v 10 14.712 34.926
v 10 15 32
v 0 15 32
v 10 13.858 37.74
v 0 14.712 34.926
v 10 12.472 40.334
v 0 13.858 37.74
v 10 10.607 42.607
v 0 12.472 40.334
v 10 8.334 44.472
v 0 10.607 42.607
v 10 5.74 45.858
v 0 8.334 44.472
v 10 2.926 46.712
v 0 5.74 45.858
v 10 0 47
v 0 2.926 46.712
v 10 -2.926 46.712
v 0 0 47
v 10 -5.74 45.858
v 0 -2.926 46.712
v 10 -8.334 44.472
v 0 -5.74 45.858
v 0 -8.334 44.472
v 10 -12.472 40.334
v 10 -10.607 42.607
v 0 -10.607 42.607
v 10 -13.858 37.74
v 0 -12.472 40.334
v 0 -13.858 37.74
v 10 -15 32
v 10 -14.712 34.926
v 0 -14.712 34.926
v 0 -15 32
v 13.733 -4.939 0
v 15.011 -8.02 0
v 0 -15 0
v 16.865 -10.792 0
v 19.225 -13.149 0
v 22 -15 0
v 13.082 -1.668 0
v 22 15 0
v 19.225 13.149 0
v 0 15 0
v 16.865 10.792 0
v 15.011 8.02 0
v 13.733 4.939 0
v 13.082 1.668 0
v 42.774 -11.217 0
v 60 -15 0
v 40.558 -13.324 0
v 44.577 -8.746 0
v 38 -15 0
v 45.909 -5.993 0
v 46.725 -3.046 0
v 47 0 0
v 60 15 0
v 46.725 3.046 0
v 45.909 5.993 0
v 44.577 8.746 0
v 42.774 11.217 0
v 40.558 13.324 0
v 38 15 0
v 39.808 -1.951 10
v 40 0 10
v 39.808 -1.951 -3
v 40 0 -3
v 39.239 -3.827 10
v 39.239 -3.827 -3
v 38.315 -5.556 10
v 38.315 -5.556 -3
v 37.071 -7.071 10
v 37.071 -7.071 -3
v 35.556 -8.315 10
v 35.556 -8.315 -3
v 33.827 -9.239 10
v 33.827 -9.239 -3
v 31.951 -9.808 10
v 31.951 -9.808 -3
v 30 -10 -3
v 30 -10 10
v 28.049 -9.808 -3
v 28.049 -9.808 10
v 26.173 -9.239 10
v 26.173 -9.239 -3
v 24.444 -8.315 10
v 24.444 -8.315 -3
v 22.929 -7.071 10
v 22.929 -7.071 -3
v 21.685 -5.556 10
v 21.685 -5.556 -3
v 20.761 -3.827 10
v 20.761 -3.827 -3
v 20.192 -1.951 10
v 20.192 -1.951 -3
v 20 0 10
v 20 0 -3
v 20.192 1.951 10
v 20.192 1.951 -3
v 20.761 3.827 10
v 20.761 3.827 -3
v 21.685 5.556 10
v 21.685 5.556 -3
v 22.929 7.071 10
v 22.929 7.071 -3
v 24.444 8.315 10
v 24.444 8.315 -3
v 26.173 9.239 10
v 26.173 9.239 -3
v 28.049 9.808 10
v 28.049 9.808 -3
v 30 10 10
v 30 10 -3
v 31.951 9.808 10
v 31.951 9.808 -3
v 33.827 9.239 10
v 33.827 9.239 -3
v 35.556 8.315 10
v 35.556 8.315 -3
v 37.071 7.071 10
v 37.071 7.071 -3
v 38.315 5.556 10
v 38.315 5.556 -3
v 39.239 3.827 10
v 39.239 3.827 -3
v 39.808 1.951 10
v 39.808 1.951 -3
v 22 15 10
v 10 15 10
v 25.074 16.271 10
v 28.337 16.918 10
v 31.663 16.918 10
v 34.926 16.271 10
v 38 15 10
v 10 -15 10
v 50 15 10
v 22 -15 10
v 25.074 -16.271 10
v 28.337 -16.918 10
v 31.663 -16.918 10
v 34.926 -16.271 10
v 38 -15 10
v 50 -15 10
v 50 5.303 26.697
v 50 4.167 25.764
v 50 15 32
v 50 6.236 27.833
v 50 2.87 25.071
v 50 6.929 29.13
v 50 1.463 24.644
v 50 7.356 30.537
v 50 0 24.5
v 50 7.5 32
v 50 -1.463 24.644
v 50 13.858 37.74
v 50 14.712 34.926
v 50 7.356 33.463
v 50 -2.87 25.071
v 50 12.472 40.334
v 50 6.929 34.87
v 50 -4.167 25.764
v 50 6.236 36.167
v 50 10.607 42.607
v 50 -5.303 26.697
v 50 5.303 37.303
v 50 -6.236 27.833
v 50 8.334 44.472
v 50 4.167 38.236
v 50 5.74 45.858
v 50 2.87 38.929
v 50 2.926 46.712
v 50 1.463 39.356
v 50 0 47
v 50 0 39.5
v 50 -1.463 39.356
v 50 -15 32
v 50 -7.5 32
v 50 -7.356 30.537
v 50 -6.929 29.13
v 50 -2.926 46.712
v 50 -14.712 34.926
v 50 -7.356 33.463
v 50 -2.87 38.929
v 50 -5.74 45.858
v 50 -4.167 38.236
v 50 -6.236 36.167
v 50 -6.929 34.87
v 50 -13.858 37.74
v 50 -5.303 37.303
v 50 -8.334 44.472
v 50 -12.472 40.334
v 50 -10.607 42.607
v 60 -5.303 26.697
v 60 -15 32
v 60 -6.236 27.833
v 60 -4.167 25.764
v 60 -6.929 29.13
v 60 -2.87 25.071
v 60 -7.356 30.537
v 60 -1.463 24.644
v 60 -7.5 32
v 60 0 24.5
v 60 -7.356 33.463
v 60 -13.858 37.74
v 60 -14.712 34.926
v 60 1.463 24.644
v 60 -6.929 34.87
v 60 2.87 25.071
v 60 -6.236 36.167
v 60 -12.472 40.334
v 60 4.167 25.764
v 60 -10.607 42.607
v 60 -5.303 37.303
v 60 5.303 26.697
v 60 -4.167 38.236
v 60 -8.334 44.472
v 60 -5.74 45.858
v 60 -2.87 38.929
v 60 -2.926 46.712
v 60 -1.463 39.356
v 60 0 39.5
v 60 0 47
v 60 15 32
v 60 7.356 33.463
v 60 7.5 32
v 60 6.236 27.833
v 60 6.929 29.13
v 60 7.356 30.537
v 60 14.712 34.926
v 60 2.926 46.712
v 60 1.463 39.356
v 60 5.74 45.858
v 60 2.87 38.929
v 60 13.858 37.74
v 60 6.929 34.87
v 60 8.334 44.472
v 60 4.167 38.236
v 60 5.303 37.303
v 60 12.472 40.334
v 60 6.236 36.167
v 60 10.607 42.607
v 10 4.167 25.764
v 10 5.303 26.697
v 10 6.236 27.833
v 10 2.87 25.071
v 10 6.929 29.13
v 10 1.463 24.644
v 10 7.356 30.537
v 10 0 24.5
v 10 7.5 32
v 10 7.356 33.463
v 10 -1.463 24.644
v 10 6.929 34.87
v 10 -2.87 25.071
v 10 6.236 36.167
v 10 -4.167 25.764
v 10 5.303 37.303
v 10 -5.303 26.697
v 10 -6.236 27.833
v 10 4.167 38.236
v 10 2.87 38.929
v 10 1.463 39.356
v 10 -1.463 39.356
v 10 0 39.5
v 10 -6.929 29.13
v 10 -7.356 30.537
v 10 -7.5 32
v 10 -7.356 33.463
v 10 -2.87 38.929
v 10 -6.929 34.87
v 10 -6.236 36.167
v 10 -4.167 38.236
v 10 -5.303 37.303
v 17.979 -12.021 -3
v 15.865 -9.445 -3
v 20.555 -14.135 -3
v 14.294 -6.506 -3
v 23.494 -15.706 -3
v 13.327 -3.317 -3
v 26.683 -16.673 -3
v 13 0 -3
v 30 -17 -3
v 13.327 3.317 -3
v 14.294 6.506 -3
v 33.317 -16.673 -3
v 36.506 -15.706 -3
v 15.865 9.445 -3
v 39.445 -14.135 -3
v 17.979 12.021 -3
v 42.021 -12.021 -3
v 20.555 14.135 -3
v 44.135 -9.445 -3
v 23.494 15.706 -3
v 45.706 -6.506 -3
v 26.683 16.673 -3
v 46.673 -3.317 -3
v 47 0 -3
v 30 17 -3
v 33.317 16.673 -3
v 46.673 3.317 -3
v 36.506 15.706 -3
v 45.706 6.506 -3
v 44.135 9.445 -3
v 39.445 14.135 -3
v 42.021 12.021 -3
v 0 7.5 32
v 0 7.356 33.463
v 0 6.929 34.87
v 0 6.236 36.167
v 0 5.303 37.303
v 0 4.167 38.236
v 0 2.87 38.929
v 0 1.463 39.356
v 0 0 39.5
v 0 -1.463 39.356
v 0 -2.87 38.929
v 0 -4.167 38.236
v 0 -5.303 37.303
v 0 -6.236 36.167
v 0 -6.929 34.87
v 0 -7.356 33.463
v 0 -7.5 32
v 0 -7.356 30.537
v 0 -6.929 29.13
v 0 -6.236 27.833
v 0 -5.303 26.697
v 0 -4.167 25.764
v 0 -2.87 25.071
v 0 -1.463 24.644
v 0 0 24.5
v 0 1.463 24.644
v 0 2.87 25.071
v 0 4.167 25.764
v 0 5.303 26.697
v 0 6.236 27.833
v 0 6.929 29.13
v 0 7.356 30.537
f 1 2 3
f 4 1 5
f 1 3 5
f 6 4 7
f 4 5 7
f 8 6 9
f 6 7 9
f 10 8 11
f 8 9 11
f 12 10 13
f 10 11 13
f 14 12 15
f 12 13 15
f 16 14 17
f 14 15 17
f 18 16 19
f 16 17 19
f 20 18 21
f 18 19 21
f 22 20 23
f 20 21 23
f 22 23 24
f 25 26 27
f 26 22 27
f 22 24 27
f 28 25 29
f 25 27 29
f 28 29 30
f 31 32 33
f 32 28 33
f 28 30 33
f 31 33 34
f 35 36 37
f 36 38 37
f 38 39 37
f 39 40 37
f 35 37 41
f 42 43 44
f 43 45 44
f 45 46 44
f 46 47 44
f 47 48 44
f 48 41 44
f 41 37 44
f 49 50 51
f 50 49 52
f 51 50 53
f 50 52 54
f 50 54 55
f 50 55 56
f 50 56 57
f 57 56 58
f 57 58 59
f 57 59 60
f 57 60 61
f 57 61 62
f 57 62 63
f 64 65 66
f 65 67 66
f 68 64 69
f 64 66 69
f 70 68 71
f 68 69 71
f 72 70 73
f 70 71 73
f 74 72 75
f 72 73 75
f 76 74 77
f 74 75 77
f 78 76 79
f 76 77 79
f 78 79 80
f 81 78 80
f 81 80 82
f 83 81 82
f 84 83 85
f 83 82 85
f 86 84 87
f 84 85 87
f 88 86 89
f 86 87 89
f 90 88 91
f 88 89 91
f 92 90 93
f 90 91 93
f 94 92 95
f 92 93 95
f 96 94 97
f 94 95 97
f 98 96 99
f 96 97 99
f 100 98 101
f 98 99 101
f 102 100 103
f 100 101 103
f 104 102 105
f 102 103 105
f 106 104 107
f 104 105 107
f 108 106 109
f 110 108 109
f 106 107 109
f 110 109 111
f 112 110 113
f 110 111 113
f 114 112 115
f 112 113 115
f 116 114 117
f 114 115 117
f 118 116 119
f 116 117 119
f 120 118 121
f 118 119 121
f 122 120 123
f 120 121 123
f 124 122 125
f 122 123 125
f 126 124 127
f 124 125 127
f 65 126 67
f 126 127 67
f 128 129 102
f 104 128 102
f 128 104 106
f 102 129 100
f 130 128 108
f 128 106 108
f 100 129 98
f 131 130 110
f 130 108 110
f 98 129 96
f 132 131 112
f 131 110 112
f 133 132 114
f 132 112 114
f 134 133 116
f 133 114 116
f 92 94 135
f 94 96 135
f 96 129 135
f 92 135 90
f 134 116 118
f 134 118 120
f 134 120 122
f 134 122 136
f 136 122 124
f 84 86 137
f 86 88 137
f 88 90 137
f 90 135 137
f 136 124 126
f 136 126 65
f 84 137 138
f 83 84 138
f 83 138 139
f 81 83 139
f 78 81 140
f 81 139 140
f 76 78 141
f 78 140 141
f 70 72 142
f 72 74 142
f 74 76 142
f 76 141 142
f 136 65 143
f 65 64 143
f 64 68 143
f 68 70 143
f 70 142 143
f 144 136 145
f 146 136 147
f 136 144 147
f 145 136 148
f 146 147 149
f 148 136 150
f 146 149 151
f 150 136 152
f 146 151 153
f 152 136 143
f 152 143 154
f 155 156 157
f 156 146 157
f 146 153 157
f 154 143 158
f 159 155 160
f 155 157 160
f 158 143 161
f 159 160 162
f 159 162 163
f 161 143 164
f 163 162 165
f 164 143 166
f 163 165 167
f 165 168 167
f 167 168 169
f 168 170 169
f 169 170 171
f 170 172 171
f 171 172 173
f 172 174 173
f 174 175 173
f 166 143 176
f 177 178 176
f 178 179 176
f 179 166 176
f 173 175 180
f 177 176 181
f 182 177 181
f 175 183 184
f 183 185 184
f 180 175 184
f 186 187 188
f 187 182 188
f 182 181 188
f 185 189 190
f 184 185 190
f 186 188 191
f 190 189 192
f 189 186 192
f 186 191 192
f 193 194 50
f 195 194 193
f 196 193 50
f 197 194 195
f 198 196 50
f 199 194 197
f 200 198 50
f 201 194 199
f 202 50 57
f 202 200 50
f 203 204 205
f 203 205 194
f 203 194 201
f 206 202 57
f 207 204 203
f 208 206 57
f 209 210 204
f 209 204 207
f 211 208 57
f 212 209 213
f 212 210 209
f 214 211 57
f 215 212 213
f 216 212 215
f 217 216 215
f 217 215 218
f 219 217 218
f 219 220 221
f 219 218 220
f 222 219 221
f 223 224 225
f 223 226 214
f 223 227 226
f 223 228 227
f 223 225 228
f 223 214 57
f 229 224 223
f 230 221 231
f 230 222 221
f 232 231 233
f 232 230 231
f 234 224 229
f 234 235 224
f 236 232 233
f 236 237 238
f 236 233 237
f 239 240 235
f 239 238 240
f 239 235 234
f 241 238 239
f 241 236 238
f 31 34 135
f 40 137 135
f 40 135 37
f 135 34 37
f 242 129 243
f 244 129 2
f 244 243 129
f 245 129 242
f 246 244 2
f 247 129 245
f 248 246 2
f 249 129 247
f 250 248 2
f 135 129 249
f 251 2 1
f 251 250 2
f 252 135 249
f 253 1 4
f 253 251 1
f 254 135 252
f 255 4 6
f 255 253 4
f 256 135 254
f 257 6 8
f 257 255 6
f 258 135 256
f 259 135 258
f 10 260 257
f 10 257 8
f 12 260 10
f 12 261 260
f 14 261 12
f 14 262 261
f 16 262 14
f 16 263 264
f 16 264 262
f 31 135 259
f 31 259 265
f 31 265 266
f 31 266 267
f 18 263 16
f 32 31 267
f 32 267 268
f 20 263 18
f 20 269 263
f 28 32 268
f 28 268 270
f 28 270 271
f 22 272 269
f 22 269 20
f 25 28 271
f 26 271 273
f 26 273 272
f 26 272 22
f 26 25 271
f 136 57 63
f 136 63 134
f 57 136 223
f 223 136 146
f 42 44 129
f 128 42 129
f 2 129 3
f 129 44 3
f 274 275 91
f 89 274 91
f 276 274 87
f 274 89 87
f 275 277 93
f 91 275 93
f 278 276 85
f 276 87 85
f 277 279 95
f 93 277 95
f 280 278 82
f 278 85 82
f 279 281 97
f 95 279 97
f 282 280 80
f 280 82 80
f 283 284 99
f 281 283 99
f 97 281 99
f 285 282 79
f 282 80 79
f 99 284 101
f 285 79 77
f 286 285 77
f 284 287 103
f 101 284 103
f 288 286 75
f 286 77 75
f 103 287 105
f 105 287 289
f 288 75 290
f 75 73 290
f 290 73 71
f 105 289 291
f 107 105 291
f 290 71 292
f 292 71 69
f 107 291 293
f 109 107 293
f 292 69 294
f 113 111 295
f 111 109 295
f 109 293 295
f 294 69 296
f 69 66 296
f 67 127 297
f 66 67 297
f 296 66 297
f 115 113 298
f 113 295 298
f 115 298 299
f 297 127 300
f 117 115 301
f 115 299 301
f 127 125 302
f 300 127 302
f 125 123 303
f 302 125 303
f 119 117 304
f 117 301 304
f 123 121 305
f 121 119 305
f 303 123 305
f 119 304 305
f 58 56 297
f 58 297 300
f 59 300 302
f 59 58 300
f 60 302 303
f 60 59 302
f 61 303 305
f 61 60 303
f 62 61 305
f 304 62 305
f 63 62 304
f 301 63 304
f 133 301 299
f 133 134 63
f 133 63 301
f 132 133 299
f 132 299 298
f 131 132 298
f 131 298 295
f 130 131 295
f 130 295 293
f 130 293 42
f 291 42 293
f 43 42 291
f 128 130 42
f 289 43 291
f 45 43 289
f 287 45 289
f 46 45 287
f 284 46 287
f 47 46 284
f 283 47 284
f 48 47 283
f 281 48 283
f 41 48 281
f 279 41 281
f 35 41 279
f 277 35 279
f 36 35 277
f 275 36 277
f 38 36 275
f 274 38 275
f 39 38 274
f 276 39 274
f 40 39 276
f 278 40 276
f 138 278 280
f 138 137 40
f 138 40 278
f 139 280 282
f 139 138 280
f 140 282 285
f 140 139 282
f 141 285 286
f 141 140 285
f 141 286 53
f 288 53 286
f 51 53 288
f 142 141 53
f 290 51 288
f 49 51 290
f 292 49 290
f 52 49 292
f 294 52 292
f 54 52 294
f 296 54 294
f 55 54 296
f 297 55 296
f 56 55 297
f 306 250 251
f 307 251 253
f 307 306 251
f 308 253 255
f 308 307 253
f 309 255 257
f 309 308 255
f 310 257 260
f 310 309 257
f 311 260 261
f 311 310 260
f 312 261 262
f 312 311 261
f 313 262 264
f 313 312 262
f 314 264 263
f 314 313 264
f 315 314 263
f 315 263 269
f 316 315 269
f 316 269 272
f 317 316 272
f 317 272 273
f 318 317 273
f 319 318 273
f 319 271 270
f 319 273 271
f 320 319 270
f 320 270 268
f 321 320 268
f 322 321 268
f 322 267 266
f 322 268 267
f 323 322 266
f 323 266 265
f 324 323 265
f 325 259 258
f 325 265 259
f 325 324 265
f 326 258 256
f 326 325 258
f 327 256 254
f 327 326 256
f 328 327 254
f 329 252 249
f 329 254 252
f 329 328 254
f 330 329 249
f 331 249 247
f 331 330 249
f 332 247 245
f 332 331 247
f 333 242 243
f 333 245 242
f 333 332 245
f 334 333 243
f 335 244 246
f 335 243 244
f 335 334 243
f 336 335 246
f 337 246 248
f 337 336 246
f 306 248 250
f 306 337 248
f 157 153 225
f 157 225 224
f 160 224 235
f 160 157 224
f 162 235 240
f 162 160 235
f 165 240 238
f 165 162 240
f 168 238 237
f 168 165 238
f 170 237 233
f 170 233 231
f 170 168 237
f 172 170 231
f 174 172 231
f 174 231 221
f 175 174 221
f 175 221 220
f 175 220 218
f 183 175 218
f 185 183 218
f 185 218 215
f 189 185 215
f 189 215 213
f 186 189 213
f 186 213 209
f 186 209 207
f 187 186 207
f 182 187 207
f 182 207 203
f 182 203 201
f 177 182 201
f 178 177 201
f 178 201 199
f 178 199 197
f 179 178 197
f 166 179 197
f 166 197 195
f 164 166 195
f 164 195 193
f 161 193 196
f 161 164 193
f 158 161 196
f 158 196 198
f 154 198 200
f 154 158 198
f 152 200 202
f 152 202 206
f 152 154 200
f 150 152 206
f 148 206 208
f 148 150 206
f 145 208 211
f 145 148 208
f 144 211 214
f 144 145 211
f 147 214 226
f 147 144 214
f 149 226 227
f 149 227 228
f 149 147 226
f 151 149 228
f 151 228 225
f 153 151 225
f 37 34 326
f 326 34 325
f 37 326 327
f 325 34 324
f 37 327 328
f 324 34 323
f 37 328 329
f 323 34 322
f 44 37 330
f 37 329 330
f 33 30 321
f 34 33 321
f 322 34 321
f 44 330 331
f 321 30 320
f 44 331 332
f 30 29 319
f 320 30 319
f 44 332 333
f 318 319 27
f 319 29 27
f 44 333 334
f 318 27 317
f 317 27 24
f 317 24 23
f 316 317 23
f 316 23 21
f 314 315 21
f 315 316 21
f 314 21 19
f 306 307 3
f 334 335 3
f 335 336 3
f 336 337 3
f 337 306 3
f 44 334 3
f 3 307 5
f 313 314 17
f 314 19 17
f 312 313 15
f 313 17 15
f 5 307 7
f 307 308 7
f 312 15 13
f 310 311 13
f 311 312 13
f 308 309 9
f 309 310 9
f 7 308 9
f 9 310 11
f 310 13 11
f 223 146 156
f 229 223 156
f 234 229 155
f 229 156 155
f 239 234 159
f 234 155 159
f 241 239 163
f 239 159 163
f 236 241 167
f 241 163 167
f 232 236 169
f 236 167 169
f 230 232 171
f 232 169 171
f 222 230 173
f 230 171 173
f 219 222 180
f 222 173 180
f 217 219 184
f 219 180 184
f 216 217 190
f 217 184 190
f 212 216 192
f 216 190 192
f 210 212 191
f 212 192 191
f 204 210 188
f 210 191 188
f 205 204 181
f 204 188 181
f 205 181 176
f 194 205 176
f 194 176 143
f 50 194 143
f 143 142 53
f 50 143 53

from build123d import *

# Parameters (mm, degrees)
F0_R     = 7.5
F1_DEPTH = 60
F3_DEPTH = 30.001
F4_W     = 40
F4_H     = 22
F5_DEPTH = 30.001
F6_R     = 17
F6_R_2   = 10
F7_DEPTH = 13
F8_R     = 10
F9_DEPTH = 47.001


with BuildPart() as f1:
    # F0 (on Right) → F1 (new body)
    with BuildSketch(Plane.YZ):
        with BuildLine():
            Line((-15, 10), (-15, 0))
            Line((-15, 0), (15, 0))
            Line((15, 0), (15, 10))
            Line((15, 10), (15, 32))
            ThreePointArc((15, 32), (0, 47), (-15, 32))
            Line((-15, 32), (-15, 10))
        make_face()
        with Locations((0, 32)):
            Circle(F0_R, mode=Mode.SUBTRACT)
    extrude(amount=F1_DEPTH)

    # F2 (on face) → F3 (cut, through all)
    with BuildSketch(Plane.XZ.offset(15)):
        Polygon((50, 85.158385), (10, 82.922354), (10, 32), (50, 32), align=None)
    extrude(amount=-F3_DEPTH, mode=Mode.SUBTRACT)

    # F4 (on face) → F5 (cut, through all)
    with BuildSketch(Plane.XZ.offset(15)):
        with Locations((30, 21)):
            Rectangle(F4_W, F4_H)
    extrude(amount=-F5_DEPTH, mode=Mode.SUBTRACT)

    # F6 (on face) → F7 (join)
    with BuildSketch(Plane.XY.offset(10)):
        with Locations((30, 0)):
            Circle(F6_R)
        with Locations((30, 0)):
            Circle(F6_R_2, mode=Mode.SUBTRACT)
    extrude(amount=-F7_DEPTH)

    # F8 (on face) → F9 (cut, through all)
    with BuildSketch(Plane(origin=(0, 0, 0), x_dir=(1, 0, 0), z_dir=(0, 0, -1))):
        with Locations((30, 0)):
            Circle(F8_R)
    extrude(amount=-F9_DEPTH, mode=Mode.SUBTRACT)


solid = f1.part
